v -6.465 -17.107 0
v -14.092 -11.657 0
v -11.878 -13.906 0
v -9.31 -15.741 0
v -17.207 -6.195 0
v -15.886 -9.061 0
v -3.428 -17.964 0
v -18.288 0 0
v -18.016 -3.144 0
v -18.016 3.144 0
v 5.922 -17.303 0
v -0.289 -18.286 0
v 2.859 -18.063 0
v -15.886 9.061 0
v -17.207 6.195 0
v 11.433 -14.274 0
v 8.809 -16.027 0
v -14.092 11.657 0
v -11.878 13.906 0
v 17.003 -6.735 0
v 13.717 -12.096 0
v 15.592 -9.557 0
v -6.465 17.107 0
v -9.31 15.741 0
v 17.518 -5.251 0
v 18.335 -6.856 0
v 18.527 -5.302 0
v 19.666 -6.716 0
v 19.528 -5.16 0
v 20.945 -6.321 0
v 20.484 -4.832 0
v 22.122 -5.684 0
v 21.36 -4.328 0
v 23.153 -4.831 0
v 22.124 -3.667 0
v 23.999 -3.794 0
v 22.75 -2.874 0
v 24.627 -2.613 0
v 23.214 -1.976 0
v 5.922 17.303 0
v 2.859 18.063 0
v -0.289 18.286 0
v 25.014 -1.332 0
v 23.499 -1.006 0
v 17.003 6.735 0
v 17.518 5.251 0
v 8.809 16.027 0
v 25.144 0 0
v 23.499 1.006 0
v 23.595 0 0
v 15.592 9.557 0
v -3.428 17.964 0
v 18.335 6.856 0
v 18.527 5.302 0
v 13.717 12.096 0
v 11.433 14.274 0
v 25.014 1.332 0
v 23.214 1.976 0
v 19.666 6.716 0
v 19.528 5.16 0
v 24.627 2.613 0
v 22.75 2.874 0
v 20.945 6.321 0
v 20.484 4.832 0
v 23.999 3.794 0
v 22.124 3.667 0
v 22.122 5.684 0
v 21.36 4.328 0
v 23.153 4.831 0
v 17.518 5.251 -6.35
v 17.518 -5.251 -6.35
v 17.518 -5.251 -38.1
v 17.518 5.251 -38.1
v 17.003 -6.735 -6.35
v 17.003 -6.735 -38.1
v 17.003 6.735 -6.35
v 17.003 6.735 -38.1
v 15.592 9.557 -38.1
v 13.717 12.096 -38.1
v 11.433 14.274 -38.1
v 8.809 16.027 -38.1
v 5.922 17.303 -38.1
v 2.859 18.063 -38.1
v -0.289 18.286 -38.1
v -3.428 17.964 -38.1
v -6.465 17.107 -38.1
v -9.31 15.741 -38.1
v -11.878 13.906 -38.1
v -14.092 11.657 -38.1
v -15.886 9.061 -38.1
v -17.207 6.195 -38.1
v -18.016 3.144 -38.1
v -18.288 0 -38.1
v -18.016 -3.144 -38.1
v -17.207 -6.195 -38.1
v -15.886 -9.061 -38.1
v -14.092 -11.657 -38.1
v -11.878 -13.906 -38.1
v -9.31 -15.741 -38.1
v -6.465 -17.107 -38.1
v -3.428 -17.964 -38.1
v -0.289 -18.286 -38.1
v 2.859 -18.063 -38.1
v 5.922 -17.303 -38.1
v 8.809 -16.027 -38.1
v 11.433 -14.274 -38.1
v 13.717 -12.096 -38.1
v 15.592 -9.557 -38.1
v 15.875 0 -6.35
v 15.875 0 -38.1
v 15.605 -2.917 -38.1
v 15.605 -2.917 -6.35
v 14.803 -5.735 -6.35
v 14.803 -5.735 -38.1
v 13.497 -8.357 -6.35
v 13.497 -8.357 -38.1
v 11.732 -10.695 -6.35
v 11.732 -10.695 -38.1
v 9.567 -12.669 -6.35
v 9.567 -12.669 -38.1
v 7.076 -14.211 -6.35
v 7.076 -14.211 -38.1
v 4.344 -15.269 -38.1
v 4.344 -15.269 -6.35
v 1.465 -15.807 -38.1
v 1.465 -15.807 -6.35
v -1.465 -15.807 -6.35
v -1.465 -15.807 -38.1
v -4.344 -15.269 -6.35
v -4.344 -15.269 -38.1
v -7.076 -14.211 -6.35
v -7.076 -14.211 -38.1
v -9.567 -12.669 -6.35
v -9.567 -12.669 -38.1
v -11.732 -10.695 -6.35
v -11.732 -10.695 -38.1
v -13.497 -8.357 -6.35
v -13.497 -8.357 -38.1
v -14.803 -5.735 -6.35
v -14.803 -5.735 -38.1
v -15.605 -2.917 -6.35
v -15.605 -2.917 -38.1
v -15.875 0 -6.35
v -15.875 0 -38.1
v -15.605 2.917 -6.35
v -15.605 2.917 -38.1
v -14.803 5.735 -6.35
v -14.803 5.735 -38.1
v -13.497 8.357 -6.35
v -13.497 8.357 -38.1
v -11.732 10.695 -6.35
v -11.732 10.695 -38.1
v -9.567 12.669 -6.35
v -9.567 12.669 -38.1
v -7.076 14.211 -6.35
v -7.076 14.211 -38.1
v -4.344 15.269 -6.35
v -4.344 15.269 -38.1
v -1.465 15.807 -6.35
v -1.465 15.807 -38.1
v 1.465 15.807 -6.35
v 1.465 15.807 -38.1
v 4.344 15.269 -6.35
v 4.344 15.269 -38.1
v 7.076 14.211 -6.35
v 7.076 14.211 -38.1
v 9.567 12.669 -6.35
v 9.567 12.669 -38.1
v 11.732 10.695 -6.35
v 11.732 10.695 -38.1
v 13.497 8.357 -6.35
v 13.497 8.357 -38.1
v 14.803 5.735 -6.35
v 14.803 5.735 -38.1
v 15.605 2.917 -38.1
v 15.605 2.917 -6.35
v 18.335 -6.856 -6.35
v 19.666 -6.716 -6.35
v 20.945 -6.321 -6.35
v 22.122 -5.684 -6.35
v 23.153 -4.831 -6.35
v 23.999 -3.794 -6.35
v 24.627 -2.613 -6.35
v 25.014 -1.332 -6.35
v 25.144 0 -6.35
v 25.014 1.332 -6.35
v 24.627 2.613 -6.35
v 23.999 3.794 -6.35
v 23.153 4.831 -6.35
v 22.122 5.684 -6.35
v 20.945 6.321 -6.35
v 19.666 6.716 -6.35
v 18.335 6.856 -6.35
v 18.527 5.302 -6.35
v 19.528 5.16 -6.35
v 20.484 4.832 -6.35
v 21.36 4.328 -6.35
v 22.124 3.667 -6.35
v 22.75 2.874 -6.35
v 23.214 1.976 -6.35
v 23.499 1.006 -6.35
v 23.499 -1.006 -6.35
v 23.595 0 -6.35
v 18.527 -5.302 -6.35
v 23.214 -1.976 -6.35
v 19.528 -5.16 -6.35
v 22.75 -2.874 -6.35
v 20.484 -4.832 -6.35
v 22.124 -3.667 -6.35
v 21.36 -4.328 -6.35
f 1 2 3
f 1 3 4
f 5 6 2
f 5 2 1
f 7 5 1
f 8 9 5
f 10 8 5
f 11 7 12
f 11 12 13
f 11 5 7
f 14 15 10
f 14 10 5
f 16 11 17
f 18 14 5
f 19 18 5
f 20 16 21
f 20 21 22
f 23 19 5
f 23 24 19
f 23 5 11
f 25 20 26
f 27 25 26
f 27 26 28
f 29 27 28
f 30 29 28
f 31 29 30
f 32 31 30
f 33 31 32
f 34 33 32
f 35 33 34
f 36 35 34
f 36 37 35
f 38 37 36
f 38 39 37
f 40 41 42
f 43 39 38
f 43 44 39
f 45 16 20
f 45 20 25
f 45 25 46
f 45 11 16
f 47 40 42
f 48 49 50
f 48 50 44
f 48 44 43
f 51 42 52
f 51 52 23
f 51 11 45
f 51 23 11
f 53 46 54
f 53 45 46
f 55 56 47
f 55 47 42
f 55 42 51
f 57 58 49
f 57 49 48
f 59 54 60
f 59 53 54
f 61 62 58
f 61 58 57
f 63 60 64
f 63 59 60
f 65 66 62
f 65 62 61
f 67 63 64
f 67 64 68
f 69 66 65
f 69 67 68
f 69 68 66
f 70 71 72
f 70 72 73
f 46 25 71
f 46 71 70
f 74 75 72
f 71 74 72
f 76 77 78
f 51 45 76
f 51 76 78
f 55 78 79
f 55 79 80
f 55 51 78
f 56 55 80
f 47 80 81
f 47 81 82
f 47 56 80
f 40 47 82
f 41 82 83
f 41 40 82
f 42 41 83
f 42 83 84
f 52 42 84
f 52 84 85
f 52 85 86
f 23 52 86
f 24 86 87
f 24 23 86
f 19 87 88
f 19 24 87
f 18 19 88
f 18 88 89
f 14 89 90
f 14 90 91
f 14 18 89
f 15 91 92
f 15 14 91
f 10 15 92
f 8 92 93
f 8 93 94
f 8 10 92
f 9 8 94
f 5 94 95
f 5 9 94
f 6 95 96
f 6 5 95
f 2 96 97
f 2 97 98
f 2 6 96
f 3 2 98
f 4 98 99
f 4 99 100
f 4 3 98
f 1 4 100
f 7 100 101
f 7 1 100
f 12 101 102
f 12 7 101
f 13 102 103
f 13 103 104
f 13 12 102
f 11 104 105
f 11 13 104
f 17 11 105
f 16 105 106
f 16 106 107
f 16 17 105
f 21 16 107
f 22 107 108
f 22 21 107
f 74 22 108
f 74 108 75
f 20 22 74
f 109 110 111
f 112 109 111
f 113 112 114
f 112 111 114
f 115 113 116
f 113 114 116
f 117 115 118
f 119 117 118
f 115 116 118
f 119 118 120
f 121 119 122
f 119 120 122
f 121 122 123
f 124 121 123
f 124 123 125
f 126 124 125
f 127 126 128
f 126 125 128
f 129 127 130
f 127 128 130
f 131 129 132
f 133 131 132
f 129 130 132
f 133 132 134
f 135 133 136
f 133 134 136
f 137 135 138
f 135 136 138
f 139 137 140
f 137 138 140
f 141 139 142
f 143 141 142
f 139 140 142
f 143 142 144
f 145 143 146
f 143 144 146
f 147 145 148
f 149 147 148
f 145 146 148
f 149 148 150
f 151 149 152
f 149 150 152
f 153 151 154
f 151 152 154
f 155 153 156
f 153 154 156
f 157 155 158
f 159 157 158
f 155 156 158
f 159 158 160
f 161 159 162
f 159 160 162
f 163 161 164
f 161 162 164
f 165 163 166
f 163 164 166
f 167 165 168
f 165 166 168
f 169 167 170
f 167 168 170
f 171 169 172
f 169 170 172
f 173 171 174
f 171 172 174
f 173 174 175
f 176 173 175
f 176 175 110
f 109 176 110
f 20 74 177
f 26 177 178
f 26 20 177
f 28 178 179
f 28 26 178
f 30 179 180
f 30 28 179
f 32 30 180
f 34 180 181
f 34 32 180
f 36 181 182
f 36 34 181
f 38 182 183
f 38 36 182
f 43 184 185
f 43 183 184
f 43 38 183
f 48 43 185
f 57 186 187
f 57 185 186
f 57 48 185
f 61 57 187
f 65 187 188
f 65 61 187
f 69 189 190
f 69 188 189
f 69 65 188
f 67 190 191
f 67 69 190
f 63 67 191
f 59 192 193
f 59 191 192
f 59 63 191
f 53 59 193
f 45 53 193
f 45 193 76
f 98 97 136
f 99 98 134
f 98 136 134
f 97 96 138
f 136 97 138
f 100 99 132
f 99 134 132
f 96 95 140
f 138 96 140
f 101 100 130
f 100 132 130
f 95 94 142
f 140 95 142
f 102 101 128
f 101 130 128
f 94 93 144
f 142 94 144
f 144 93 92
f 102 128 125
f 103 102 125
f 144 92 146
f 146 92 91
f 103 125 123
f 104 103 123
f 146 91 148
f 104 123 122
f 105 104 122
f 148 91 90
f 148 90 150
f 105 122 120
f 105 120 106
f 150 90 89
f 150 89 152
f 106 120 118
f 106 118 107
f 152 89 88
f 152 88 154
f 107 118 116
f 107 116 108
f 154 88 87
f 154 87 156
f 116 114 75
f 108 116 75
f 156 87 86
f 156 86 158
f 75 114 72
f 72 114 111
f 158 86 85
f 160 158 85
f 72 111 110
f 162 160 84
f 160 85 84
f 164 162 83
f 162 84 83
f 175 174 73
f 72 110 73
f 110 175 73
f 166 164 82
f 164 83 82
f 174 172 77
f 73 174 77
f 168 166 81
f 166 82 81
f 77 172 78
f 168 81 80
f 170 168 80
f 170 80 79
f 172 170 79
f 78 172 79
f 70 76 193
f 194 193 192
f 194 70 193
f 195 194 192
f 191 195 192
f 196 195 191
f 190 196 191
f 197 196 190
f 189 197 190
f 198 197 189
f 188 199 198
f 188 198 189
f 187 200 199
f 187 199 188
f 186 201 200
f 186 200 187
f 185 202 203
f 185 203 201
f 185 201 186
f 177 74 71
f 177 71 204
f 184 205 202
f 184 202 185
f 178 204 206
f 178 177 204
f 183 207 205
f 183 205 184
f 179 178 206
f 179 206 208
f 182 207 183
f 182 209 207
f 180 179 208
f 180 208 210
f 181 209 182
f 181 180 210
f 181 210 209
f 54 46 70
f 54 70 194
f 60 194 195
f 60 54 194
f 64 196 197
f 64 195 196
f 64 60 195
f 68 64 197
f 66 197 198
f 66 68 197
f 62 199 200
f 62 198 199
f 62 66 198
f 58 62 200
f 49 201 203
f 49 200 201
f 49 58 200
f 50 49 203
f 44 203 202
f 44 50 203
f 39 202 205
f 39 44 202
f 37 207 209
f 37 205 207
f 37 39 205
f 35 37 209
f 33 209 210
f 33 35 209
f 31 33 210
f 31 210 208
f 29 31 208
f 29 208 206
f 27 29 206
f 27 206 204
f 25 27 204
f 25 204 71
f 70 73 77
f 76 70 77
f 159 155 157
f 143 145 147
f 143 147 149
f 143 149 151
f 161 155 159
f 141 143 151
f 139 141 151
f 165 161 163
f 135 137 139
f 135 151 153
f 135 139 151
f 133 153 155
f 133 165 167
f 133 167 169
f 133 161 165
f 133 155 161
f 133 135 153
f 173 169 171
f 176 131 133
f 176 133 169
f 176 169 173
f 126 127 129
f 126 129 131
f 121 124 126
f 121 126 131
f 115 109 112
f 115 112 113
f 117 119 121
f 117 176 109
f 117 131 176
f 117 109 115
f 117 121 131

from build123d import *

# Parameters (mm, degrees)
F1_DEPTH = 38.1
F2_R     = 15.875
F3_DEPTH = 31.75
F5_DEPTH = 31.75


with BuildPart() as f1:
    # F0 (on Top) → F1 (new body)
    with BuildSketch(Plane.XY):
        with BuildLine():
            Line((17.5179102392, -5.2510727335), (17.5179102392, 5.2510727335))
            ThreePointArc((17.5179102392, 5.2510727335), (17.276294132, 5.9983835377), (17.0028141207, 6.7346310944))
            ThreePointArc((17.0028141207, 6.7346310944), (-18.288, 0), (17.0028141207, -6.7346310944))
            ThreePointArc((17.0028141207, -6.7346310944), (17.276294132, -5.9983835377), (17.5179102392, -5.2510727335))
        make_face()
        with BuildLine():
            ThreePointArc((17.0028141207, 6.7346310944), (17.276294132, 5.9983835377), (17.5179102392, 5.2510727335))
            ThreePointArc((17.5179102392, 5.2510727335), (23.5952406288, 0), (17.5179102392, -5.2510727335))
            ThreePointArc((17.5179102392, -5.2510727335), (17.276294132, -5.9983835377), (17.0028141207, -6.7346310944))
            ThreePointArc((17.0028141207, -6.7346310944), (25.1441620986, 0), (17.0028141207, 6.7346310944))
        make_face()
    extrude(amount=-F1_DEPTH)

    # F2 (on face) → F3 (cut)
    with BuildSketch(Plane(origin=(0, 0, -38.1), x_dir=(1, 0, 0), z_dir=(0, 0, -1))):
        Circle(F2_R)
    extrude(amount=-F3_DEPTH, mode=Mode.SUBTRACT)

    # F4 (on face) → F5 (cut)
    with BuildSketch(Plane(origin=(0, 0, -38.1), x_dir=(1, 0, 0), z_dir=(0, 0, -1))):
        with BuildLine():
            ThreePointArc((17.0028141207, -6.7346310944), (25.1441620986, 0), (17.0028141207, 6.7346310944))
            Line((17.0028141207, 6.7346310944), (17.5179102392, 5.2510727335))
            ThreePointArc((17.5179102392, 5.2510727335), (23.5952406288, 0), (17.5179102392, -5.2510727335))
            Line((17.5179102392, -5.2510727335), (17.0028141207, -6.7346310944))
        make_face()
    extrude(amount=-F5_DEPTH, mode=Mode.SUBTRACT)


solid = f1.part
